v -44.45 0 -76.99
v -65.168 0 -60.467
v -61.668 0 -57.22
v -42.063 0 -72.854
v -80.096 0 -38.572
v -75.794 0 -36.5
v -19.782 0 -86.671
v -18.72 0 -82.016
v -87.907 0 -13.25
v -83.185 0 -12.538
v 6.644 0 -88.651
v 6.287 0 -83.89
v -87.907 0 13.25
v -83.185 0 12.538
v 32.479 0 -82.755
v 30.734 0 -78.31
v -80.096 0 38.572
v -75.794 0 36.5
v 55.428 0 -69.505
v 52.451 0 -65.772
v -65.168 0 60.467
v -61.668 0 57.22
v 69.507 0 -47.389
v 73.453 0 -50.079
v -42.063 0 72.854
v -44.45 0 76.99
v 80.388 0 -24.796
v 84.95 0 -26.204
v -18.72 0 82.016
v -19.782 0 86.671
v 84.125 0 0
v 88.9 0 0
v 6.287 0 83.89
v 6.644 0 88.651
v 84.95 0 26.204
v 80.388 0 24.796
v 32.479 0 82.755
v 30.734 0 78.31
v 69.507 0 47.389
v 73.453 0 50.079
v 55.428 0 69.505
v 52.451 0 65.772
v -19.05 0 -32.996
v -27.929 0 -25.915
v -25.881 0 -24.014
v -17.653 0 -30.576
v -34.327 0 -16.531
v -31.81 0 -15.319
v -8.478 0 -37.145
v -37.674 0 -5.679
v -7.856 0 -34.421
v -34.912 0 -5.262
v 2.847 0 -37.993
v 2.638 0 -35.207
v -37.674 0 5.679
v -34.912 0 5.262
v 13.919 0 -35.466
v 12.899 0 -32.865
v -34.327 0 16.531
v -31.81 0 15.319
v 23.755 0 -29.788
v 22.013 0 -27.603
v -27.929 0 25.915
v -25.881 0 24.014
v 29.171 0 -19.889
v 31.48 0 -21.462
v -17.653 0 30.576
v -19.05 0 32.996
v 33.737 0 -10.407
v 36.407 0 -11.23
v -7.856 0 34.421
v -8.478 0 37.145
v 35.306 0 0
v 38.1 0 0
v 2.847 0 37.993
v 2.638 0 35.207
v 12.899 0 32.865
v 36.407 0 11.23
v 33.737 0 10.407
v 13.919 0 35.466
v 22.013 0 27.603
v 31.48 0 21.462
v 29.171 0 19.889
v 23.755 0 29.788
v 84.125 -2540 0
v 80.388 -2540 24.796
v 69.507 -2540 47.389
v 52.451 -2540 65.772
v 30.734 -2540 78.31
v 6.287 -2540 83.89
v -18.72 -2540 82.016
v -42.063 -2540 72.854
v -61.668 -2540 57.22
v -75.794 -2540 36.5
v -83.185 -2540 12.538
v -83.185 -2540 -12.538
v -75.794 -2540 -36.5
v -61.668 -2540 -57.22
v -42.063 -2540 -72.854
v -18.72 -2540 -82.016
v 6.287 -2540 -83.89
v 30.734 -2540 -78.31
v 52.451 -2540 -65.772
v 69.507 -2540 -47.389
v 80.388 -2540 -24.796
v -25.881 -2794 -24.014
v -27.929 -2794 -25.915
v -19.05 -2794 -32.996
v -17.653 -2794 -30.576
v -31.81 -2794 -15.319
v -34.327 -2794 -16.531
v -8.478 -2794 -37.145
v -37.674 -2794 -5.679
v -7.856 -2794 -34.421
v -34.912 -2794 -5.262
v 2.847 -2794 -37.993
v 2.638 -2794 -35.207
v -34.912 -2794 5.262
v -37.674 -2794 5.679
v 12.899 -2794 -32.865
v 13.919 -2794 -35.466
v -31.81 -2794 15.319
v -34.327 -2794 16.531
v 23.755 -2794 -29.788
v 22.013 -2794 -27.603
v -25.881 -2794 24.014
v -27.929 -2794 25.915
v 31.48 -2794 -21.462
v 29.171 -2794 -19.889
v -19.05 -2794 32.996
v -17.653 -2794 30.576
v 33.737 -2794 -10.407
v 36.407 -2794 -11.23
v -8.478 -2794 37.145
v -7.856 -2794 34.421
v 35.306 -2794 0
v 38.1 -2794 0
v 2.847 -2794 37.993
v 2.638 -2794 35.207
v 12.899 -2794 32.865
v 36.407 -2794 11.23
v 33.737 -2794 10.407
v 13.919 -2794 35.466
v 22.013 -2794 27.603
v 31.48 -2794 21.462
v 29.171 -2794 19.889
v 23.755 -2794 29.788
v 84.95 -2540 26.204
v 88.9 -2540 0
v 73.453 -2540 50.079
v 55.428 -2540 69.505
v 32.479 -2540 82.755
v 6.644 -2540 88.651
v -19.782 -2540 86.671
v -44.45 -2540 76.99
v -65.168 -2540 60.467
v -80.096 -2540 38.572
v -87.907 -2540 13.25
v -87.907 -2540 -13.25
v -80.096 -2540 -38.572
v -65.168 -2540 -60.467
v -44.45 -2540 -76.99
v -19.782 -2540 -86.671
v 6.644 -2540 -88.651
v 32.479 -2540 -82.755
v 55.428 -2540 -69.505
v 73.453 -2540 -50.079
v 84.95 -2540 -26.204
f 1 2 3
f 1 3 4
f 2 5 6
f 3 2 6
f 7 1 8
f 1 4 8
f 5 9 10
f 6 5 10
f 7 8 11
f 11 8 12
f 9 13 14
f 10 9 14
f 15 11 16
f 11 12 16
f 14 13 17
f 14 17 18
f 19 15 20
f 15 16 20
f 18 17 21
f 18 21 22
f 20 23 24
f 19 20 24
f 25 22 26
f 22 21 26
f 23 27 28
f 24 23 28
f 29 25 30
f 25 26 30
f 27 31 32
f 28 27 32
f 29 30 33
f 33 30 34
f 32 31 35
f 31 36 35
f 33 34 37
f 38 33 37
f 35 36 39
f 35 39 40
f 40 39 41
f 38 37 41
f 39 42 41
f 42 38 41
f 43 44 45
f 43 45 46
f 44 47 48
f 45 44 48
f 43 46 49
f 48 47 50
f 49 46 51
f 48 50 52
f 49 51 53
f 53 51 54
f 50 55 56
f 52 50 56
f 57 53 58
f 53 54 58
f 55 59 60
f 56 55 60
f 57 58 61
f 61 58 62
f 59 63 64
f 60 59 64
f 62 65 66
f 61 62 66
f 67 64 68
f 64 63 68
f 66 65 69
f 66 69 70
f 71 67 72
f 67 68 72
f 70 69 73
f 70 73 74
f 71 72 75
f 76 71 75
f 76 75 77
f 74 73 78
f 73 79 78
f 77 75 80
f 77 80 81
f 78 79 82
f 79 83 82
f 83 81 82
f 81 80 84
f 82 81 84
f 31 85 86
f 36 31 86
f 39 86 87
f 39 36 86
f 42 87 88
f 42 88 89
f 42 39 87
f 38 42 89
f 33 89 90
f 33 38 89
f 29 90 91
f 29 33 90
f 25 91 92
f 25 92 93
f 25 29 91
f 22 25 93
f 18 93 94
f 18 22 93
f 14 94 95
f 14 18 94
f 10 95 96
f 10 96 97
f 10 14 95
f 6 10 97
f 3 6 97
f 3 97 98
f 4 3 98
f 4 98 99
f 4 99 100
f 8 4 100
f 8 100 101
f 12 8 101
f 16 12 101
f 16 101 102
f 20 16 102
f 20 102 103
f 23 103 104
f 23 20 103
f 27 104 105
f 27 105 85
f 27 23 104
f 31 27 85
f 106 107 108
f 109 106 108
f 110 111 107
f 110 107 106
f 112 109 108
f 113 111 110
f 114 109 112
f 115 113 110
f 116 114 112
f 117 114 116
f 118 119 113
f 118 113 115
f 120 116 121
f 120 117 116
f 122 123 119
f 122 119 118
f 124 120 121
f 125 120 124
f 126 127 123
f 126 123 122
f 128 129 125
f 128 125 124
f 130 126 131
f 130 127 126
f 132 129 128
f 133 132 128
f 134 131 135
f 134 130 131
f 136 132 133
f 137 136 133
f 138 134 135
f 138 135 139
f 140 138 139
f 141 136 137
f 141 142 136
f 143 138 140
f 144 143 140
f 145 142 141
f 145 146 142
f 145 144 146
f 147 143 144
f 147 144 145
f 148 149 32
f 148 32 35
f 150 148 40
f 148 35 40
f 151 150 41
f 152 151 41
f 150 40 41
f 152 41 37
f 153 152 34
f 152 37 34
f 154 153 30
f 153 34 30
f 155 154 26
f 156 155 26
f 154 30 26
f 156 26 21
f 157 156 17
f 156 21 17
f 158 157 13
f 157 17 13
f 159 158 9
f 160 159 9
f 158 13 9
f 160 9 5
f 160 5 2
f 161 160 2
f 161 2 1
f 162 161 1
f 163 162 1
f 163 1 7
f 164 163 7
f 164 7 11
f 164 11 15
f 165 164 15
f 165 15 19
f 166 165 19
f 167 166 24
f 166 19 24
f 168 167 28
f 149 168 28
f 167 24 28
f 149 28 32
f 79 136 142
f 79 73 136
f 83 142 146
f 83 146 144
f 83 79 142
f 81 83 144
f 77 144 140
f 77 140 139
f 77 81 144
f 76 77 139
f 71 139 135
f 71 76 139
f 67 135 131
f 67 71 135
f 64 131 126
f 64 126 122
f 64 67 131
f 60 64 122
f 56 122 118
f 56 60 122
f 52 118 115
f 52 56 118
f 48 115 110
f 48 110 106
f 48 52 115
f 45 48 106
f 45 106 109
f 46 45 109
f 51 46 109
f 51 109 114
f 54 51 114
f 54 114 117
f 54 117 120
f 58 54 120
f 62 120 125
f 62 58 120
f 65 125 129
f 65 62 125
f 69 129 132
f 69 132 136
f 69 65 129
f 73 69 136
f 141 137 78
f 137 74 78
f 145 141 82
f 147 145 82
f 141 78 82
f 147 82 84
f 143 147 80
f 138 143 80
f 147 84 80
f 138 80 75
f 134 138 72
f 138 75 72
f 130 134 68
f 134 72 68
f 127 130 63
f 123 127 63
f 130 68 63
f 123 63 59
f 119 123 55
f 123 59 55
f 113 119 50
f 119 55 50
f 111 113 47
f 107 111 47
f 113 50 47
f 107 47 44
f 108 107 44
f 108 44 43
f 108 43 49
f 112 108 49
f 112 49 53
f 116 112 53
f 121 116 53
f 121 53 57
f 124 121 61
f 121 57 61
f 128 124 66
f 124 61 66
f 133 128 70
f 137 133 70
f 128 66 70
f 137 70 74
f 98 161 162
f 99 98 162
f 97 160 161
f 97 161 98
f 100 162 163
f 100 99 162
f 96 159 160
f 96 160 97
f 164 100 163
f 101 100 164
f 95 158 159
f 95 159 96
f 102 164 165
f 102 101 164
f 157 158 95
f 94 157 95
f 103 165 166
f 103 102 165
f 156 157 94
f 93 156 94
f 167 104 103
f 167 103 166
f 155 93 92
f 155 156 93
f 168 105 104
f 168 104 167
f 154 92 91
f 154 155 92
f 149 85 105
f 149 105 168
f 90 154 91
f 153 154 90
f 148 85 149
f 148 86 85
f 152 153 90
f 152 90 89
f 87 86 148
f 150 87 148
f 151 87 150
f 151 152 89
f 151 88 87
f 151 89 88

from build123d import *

# Parameters (mm, degrees)
F0_R     = 88.9
F0_R_2   = 84.1250430216
F1_DEPTH = 2540
F0_R_3   = 38.1
F0_R_4   = 35.306
F3_DEPTH = 254


# Not quite as in the source:
# - the program builds the solid bodies; features that only make, move or delete a surface that nothing else refers to are left out


with BuildPart() as f1:
    # F0 (on Front) → F1 (new body)
    with BuildSketch(Plane.XZ):
        Circle(F0_R)
        Circle(F0_R_2, mode=Mode.SUBTRACT)
    extrude(amount=F1_DEPTH)


with BuildPart() as f1b:
    # F0 (on Front) → F1, piece 2 (new body)
    with BuildSketch(Plane.XZ):
        Circle(F0_R_3)
        Circle(F0_R_4, mode=Mode.SUBTRACT)
    extrude(amount=F1_DEPTH)

    # F3 (add): a face of the model
    f3_faces = [f1b.faces().sort_by_distance(p)[0] for p in [
        (-37.0223692655, -2540, 0),
    ]]
    extrude(f3_faces, amount=F3_DEPTH)


solid = Compound([f1.part, f1b.part])
